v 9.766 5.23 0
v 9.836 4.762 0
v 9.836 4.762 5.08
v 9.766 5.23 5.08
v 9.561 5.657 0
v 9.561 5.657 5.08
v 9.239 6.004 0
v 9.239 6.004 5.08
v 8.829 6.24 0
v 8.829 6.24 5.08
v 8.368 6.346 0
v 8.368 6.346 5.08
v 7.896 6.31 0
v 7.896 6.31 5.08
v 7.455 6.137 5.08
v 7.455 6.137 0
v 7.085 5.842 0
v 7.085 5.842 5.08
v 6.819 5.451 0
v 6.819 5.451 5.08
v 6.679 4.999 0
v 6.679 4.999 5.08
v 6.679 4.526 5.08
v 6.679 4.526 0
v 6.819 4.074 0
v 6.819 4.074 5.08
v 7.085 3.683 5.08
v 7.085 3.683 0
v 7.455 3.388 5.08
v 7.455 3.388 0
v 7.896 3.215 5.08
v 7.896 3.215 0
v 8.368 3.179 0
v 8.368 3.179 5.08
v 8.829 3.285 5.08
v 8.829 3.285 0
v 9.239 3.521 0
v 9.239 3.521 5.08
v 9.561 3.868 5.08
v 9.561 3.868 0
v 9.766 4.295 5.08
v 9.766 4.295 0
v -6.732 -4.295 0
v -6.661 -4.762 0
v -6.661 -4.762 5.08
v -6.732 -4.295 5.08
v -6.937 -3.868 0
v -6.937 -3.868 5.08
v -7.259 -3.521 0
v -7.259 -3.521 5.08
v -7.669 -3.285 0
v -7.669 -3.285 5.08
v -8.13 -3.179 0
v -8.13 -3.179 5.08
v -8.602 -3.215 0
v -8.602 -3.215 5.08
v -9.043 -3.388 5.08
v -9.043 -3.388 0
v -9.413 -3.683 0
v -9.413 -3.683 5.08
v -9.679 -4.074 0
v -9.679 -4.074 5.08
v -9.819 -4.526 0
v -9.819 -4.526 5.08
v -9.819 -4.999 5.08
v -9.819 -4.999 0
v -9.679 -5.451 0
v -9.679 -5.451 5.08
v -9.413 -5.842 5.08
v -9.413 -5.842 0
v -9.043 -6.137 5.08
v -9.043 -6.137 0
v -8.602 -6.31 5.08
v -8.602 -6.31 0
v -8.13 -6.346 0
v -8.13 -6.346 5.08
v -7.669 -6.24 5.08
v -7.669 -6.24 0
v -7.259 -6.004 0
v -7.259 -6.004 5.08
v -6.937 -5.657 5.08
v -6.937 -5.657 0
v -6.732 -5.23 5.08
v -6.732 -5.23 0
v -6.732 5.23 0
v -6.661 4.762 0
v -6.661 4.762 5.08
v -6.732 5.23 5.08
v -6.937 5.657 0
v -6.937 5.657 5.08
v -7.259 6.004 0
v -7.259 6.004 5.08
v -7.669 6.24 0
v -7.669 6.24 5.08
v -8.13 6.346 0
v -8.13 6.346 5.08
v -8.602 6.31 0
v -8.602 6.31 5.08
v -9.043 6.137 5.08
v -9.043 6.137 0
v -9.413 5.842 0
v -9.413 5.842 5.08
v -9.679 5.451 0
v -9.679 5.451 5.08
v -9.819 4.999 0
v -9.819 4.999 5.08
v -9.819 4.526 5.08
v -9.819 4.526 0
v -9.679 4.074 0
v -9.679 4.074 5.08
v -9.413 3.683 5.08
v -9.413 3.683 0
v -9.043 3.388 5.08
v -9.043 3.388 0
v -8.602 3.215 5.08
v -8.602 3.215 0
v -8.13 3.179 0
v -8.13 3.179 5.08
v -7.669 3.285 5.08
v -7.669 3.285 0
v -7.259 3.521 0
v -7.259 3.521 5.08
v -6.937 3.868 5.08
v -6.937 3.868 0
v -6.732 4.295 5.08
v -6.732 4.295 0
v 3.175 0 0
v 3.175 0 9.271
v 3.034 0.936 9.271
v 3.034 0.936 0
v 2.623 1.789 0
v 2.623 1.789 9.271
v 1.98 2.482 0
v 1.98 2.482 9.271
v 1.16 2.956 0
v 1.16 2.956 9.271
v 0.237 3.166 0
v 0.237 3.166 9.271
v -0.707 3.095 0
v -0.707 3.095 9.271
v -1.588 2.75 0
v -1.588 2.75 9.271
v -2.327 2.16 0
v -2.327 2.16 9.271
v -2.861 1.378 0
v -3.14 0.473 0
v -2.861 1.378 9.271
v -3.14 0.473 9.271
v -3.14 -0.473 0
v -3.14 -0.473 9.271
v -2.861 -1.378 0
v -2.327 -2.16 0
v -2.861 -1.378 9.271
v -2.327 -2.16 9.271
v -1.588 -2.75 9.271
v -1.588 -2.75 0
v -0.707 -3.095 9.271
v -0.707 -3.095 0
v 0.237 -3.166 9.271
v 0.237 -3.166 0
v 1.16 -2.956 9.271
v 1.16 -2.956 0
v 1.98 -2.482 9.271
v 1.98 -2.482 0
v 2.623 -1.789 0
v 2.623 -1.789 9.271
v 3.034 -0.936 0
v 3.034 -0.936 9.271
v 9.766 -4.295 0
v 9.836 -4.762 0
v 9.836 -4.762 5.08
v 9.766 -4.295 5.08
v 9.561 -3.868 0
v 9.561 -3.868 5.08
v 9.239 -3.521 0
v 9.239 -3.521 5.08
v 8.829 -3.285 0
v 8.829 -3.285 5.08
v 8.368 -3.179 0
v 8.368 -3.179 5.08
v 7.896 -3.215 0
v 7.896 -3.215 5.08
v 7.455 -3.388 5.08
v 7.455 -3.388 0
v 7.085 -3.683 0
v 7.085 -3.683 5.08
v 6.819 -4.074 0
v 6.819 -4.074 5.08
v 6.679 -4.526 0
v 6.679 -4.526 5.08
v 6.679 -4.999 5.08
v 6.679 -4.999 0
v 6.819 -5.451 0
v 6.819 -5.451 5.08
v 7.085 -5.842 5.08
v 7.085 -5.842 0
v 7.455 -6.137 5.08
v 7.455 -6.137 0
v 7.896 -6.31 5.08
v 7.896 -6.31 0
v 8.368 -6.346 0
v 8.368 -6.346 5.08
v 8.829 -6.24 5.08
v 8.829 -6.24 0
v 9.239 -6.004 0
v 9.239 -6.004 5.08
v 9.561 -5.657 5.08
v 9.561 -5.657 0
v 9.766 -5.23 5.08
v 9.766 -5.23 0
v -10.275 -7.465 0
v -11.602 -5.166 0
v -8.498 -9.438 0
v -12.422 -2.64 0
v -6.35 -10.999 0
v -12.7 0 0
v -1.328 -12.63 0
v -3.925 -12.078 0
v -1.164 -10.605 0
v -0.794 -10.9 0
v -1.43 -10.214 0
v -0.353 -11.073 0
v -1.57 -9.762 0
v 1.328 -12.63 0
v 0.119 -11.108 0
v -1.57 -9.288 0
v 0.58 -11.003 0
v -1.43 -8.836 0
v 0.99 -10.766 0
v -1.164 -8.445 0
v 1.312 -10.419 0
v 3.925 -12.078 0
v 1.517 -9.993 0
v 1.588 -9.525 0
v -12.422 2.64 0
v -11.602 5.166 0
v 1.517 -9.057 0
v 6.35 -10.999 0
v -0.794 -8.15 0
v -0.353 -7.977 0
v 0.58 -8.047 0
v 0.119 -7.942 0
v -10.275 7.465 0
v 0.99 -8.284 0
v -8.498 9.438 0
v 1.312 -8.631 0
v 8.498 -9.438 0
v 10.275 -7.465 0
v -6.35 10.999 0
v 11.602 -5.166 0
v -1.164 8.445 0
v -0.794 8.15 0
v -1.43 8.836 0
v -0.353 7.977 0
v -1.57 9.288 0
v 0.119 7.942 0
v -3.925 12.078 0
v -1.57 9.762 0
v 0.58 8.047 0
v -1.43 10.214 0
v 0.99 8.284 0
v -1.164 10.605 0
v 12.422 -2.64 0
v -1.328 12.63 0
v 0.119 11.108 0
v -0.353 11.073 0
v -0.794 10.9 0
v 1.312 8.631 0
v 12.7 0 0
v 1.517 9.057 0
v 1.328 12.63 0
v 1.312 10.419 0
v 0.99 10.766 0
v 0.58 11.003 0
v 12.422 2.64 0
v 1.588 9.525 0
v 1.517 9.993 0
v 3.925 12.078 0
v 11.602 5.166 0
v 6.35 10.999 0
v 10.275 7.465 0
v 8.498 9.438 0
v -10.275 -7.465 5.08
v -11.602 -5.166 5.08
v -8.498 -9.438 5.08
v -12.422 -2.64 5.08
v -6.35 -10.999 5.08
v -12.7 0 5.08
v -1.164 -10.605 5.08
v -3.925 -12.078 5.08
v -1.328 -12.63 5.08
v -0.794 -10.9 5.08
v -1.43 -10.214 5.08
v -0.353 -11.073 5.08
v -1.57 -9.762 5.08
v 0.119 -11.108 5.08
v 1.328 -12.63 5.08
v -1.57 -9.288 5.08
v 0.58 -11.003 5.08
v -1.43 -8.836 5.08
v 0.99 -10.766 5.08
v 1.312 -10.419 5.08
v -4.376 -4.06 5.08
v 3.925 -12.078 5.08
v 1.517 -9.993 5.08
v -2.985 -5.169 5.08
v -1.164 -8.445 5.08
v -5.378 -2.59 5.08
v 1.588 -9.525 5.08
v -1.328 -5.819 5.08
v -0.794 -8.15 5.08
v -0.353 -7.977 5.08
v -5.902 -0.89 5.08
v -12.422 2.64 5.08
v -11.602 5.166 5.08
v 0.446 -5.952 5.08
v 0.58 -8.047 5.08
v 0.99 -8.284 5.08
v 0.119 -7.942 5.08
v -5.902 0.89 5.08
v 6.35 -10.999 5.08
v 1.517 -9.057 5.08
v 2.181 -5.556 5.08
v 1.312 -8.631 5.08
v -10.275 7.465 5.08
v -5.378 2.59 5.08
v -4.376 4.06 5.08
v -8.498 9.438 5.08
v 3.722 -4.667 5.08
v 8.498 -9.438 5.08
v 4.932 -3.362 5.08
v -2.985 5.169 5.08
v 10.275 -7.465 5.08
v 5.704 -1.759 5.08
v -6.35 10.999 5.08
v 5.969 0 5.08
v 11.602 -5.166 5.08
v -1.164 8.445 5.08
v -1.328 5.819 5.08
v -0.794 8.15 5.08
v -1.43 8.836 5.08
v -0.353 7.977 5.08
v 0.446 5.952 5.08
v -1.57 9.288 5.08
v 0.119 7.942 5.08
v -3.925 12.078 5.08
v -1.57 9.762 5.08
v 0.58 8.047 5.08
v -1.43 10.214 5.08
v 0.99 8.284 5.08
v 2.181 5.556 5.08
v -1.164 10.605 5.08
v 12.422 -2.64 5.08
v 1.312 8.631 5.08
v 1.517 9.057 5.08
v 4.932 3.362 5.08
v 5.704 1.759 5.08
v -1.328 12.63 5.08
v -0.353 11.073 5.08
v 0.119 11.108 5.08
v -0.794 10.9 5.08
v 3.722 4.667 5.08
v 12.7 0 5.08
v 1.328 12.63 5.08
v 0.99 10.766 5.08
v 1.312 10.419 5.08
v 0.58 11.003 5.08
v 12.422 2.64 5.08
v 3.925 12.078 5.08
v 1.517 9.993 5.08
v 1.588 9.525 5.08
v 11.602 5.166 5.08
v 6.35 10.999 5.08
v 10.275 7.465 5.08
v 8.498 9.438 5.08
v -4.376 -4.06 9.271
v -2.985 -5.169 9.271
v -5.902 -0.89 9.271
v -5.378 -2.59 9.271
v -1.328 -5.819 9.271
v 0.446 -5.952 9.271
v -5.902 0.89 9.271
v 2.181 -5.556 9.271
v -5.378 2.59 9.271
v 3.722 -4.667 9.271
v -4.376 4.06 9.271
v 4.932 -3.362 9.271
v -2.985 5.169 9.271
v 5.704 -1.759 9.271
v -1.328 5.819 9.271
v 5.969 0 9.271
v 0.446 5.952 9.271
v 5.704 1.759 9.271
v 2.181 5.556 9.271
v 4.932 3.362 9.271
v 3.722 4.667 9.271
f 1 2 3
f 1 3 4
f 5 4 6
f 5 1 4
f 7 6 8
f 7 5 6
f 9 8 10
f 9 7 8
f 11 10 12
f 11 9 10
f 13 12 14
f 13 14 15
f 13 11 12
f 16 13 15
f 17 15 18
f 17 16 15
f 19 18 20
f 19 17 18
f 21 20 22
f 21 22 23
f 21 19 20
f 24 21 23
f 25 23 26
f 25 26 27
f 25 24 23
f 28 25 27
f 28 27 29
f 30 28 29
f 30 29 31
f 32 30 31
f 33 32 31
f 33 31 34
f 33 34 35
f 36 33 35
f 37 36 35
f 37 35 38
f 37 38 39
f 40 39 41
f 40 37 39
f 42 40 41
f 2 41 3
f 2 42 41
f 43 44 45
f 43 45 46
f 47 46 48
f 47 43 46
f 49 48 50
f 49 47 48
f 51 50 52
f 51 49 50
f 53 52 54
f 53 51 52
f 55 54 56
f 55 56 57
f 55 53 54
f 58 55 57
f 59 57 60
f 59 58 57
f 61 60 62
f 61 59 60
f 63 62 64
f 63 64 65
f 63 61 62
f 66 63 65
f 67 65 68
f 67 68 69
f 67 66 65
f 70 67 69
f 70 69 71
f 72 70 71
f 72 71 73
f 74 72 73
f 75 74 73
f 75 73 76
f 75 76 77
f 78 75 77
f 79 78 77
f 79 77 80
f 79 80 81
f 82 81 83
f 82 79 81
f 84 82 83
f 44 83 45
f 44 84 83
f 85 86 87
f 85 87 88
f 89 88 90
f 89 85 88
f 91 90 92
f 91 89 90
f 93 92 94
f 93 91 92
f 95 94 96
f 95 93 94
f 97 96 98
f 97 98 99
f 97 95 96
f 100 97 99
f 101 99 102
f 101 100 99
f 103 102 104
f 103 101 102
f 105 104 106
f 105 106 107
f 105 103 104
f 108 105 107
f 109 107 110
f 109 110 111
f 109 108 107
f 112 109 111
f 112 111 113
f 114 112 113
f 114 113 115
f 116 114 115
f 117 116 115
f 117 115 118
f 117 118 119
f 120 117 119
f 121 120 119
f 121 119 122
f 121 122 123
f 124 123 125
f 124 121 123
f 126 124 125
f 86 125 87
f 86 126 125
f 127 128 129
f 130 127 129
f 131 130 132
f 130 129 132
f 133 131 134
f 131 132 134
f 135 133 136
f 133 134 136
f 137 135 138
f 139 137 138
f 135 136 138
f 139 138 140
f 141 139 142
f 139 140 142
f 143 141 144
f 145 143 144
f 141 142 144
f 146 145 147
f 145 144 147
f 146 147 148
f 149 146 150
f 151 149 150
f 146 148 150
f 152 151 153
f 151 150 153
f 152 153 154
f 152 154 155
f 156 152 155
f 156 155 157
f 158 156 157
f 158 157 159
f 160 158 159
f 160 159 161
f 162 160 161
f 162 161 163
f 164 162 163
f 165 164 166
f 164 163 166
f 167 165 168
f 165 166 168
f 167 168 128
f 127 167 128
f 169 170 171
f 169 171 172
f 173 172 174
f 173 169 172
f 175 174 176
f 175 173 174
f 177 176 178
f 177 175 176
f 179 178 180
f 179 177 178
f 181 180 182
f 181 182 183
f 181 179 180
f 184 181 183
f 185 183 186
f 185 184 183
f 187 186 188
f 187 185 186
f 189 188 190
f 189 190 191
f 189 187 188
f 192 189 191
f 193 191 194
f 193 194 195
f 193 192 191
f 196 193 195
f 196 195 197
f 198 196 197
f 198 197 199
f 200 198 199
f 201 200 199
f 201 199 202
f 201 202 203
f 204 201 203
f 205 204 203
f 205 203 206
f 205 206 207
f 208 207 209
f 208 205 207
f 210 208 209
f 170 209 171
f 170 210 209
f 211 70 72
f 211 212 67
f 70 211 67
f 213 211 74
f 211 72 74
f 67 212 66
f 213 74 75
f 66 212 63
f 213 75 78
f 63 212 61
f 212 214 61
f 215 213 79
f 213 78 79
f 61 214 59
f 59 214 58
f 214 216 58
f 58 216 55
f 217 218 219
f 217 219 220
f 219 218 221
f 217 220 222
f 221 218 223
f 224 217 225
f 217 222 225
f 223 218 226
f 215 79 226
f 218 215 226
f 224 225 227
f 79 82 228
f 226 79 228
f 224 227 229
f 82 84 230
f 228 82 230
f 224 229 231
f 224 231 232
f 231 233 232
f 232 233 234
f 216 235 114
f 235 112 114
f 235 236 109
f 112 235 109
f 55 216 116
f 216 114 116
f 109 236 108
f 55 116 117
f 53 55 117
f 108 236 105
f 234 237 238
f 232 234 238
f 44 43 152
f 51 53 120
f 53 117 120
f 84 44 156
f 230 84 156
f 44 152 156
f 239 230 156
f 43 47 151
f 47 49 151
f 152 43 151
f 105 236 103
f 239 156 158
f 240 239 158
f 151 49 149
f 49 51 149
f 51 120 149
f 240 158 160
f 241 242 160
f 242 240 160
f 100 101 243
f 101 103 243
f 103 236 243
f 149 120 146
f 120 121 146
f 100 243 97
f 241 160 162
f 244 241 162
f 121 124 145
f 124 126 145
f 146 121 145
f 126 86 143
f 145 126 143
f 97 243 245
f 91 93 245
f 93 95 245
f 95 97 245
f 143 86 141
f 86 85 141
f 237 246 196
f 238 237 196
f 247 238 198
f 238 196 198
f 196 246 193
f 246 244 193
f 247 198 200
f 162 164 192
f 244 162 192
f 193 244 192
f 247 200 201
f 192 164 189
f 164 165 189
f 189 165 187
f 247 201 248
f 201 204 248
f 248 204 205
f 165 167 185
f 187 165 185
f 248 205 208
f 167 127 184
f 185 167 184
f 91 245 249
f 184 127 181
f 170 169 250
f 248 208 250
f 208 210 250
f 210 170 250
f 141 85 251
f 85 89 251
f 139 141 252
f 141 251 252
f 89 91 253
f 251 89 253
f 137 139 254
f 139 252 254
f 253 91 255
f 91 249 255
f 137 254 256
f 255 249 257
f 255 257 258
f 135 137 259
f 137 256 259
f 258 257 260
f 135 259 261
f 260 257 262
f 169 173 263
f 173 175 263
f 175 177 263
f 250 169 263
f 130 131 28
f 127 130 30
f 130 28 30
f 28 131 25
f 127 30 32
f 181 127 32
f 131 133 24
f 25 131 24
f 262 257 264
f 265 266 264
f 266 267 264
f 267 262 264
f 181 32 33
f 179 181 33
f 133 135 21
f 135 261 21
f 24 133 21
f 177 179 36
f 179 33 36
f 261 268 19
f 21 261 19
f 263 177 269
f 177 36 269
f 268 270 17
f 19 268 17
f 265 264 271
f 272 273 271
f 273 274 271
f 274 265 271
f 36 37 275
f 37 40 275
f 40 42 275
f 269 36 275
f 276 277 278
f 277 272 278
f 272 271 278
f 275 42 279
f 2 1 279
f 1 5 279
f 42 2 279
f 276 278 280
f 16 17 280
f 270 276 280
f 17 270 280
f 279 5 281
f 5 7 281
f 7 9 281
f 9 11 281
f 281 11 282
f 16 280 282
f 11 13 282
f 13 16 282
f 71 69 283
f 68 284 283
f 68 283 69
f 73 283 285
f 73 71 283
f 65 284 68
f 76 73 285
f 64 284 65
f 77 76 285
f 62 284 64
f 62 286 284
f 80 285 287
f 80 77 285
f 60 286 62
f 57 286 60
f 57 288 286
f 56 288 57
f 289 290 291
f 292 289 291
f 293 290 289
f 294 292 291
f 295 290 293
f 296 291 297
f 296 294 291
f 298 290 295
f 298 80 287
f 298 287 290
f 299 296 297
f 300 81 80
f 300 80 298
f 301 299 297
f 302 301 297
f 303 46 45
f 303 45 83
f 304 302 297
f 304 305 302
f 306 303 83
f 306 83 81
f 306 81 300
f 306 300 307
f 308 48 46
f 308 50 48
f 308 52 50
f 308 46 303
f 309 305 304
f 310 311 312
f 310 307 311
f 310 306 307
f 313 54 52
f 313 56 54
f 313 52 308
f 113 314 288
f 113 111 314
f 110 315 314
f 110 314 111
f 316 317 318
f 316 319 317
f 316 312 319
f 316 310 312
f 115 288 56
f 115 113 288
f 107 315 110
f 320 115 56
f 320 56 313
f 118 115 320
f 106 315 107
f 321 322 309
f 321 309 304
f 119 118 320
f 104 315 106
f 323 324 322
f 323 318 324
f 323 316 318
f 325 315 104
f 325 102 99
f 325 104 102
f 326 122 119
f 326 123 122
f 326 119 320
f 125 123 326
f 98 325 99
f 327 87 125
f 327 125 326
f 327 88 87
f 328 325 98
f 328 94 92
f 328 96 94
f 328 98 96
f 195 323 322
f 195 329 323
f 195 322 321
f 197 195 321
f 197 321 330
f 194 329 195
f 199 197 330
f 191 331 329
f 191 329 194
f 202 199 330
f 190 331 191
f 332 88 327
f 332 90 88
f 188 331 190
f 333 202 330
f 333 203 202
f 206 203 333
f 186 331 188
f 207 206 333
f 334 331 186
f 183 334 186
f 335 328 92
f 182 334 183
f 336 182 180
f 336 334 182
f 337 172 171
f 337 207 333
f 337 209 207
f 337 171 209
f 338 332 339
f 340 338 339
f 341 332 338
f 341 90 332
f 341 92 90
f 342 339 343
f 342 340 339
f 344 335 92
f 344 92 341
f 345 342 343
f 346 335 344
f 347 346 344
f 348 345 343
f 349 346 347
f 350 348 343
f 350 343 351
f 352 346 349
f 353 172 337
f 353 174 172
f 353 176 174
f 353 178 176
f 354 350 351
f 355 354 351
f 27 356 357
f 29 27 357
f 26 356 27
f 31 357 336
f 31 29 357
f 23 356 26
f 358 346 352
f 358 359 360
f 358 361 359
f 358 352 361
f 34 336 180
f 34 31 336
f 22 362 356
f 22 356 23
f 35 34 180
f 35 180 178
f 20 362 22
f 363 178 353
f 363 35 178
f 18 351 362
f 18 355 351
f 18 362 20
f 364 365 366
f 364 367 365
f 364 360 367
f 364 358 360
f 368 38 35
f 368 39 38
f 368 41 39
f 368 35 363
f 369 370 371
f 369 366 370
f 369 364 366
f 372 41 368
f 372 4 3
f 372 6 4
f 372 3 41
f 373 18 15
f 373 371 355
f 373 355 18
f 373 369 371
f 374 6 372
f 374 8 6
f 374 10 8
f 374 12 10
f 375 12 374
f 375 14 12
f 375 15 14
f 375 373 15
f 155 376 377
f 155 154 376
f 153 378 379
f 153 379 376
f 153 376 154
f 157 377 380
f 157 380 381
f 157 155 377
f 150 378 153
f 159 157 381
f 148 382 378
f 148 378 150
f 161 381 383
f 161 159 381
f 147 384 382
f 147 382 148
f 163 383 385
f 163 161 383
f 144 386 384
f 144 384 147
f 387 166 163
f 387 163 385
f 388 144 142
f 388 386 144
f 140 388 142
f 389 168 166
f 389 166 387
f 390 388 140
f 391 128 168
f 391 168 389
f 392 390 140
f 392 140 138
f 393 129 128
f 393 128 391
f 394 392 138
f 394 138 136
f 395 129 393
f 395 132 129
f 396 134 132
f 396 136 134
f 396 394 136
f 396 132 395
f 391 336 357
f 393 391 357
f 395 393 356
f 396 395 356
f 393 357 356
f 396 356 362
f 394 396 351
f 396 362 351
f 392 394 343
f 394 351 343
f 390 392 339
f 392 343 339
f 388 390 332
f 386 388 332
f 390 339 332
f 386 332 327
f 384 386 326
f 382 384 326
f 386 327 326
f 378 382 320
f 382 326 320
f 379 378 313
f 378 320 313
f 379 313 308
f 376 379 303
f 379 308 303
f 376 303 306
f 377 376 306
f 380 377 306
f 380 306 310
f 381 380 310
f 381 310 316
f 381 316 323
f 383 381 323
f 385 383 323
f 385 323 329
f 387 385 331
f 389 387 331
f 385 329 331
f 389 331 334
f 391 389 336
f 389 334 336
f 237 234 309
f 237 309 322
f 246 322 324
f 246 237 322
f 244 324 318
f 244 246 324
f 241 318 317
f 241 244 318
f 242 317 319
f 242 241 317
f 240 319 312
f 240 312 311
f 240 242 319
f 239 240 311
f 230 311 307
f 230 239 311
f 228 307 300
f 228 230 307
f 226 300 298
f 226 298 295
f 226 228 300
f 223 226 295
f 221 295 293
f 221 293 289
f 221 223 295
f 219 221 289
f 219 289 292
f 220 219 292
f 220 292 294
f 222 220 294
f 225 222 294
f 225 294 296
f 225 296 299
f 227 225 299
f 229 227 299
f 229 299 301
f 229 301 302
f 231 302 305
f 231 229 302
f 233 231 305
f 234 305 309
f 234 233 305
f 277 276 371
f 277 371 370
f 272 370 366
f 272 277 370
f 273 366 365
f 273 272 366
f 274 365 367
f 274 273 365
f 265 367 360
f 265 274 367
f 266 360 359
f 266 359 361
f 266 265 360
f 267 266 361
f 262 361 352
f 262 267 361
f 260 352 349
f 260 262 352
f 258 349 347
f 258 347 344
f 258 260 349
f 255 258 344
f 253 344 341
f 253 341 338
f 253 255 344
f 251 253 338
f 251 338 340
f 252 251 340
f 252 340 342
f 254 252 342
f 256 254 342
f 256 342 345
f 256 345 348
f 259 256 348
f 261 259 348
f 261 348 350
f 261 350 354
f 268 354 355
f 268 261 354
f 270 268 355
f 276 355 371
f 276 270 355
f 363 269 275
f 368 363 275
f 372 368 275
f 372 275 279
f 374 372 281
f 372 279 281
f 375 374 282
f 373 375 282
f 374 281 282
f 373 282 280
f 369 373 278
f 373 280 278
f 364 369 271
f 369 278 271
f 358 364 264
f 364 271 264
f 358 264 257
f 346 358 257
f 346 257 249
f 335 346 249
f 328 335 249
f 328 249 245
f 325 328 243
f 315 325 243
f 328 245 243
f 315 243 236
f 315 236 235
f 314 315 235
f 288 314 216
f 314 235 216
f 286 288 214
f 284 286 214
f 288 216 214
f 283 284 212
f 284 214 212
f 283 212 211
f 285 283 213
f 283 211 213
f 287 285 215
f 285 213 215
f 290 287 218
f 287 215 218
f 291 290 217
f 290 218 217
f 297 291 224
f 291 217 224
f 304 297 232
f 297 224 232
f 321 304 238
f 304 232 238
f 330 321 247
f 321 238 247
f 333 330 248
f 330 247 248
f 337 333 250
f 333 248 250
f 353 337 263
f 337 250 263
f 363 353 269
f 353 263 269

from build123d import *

# Parameters (mm, degrees)
SKETCH1_R           = 12.7
SKETCH1_R_2         = 1.5875
BOSS_EXTRUDE1_DEPTH = 5.08
SKETCH2_R           = 5.969
BOSS_EXTRUDE2_DEPTH = 4.191
SKETCH3_R           = 3.175
CUT_EXTRUDE1_DEPTH  = 9.271


with BuildPart() as part:
    # Sketch1 → Boss-Extrude1 (new body)
    with BuildSketch(Plane.XY):
        Circle(SKETCH1_R)
        with Locations((0, 9.525)):
            Circle(SKETCH1_R_2, mode=Mode.SUBTRACT)
        with Locations((8.248891971, 4.7625)):
            Circle(SKETCH1_R_2, mode=Mode.SUBTRACT)
        with Locations((8.248891971, -4.7625)):
            Circle(SKETCH1_R_2, mode=Mode.SUBTRACT)
        with Locations((0, -9.525)):
            Circle(SKETCH1_R_2, mode=Mode.SUBTRACT)
        with Locations((-8.248891971, -4.7625)):
            Circle(SKETCH1_R_2, mode=Mode.SUBTRACT)
        with Locations((-8.248891971, 4.7625)):
            Circle(SKETCH1_R_2, mode=Mode.SUBTRACT)
    extrude(amount=BOSS_EXTRUDE1_DEPTH)

    # Sketch2 → Boss-Extrude2 (add)
    with BuildSketch(Plane.XY.offset(5.08)):
        Circle(SKETCH2_R)
    extrude(amount=BOSS_EXTRUDE2_DEPTH)

    # Sketch3 → Cut-Extrude1 (cut)
    with BuildSketch(Plane.XY.offset(9.271)):
        Circle(SKETCH3_R)
    extrude(amount=-CUT_EXTRUDE1_DEPTH, mode=Mode.SUBTRACT)


solid = part.part
